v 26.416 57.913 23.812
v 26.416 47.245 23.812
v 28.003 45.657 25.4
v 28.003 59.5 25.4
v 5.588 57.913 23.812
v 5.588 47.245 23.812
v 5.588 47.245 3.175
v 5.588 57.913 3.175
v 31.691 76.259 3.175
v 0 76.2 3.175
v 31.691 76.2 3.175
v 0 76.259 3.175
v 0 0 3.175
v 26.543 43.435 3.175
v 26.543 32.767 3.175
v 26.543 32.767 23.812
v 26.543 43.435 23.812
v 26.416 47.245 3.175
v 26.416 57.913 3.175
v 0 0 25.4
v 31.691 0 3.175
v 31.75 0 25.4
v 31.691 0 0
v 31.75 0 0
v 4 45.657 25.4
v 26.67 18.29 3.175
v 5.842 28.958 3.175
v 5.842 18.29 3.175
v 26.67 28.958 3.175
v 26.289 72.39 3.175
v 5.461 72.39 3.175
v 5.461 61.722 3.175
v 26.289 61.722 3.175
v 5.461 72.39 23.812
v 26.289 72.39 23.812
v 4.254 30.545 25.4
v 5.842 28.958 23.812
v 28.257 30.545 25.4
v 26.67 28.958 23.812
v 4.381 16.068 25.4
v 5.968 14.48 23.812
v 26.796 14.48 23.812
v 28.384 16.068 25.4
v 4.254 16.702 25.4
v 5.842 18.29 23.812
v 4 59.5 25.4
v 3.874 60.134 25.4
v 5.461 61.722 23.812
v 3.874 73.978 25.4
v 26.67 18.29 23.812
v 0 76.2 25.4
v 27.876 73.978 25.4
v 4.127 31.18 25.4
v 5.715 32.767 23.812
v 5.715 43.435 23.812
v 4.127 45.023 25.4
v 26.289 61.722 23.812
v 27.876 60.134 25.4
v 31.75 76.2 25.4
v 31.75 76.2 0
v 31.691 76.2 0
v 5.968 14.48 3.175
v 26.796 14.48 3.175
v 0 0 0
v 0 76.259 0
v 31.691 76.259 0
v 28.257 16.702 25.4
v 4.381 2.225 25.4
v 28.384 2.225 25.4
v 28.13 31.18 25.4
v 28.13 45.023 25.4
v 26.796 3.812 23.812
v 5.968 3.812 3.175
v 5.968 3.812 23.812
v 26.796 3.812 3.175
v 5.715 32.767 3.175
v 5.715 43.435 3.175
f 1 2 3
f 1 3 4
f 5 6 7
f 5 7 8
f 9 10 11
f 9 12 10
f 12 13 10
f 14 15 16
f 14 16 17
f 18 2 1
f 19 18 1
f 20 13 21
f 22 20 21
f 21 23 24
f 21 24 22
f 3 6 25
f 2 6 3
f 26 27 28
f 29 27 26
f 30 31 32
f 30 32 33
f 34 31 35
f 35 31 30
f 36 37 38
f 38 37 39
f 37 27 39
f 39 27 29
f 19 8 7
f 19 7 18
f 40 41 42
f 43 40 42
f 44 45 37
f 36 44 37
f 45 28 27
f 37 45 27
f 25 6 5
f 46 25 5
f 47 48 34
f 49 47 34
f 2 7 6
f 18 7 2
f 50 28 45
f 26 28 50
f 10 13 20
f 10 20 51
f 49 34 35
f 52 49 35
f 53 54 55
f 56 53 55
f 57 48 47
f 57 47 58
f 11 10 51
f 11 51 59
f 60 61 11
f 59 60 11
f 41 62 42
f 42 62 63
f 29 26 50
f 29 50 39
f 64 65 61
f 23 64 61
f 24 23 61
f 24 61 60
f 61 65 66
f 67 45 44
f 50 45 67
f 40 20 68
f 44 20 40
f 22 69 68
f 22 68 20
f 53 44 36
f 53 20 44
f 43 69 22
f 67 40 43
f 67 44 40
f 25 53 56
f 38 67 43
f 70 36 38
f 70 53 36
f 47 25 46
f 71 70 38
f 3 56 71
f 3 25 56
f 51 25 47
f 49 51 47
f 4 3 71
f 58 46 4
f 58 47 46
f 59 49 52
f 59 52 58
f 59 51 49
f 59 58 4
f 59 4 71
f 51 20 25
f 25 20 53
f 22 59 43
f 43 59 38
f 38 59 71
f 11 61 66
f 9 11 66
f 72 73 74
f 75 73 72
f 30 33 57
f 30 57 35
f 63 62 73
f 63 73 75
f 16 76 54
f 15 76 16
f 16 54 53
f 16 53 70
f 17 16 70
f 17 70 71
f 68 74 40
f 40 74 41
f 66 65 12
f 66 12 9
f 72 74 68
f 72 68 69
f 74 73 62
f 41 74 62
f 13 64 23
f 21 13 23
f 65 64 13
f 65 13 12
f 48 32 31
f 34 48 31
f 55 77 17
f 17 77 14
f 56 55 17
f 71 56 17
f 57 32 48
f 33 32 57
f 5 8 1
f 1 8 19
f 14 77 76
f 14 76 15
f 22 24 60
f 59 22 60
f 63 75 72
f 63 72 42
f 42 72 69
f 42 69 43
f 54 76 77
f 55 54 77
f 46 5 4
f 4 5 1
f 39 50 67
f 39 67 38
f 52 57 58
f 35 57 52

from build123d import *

# Parameters (mm, degrees)
F0_W     = 31.75
F0_H     = 76.2
F0_W_2   = 20.828
F0_H_2   = 10.668
F1_DEPTH = 25.4
F2_W     = 31.691335
F2_H     = 76.259181
F3_DEPTH = 3.175
F4_SIZE  = 1.5875


with BuildPart() as f1:
    # F0 (on Top) → F1 (new body)
    with BuildSketch(Plane.XY):
        with Locations((15.875, 38.1)):
            Rectangle(F0_W, F0_H)
        with Locations((16.382345, 9.146222)):
            Rectangle(F0_W_2, F0_H_2, mode=Mode.SUBTRACT)
        with Locations((16.255509, 23.623667)):
            Rectangle(F0_W_2, F0_H_2, mode=Mode.SUBTRACT)
        with Locations((16.128672, 38.101111)):
            Rectangle(F0_W_2, F0_H_2, mode=Mode.SUBTRACT)
        with Locations((16.001836, 52.578556)):
            Rectangle(F0_W_2, F0_H_2, mode=Mode.SUBTRACT)
        with Locations((15.875, 67.056)):
            Rectangle(F0_W_2, F0_H_2, mode=Mode.SUBTRACT)
    extrude(amount=F1_DEPTH)

    # F2 (on Top) → F3 (join)
    with BuildSketch(Plane.XY):
        with Locations((15.845667, 38.12959)):
            Rectangle(F2_W, F2_H)
    extrude(amount=F3_DEPTH)

    # F4
    f4_edges = [f1.edges().sort_by_distance(p)[0] for p in [
        (5.968345, 9.146222, 25.4),
        (16.382345, 3.812222, 25.4),
        (26.796345, 9.146222, 25.4),
        (16.382345, 14.480222, 25.4),
        (16.255509, 18.289667, 25.4),
        (5.841509, 23.623667, 25.4),
        (26.669509, 23.623667, 25.4),
        (16.255509, 28.957667, 25.4),
        (16.128672, 32.767111, 25.4),
        (5.714672, 38.101111, 25.4),
        (26.542672, 38.101111, 25.4),
        (16.128672, 43.435111, 25.4),
        (16.001836, 57.912556, 25.4),
        (5.587836, 52.578556, 25.4),
        (16.001836, 47.244556, 25.4),
        (26.415836, 52.578556, 25.4),
        (15.875, 61.722, 25.4),
        (5.461, 67.056, 25.4),
        (15.875, 72.39, 25.4),
        (26.289, 67.056, 25.4),
    ]]
    chamfer(f4_edges, length=F4_SIZE)


solid = f1.part
